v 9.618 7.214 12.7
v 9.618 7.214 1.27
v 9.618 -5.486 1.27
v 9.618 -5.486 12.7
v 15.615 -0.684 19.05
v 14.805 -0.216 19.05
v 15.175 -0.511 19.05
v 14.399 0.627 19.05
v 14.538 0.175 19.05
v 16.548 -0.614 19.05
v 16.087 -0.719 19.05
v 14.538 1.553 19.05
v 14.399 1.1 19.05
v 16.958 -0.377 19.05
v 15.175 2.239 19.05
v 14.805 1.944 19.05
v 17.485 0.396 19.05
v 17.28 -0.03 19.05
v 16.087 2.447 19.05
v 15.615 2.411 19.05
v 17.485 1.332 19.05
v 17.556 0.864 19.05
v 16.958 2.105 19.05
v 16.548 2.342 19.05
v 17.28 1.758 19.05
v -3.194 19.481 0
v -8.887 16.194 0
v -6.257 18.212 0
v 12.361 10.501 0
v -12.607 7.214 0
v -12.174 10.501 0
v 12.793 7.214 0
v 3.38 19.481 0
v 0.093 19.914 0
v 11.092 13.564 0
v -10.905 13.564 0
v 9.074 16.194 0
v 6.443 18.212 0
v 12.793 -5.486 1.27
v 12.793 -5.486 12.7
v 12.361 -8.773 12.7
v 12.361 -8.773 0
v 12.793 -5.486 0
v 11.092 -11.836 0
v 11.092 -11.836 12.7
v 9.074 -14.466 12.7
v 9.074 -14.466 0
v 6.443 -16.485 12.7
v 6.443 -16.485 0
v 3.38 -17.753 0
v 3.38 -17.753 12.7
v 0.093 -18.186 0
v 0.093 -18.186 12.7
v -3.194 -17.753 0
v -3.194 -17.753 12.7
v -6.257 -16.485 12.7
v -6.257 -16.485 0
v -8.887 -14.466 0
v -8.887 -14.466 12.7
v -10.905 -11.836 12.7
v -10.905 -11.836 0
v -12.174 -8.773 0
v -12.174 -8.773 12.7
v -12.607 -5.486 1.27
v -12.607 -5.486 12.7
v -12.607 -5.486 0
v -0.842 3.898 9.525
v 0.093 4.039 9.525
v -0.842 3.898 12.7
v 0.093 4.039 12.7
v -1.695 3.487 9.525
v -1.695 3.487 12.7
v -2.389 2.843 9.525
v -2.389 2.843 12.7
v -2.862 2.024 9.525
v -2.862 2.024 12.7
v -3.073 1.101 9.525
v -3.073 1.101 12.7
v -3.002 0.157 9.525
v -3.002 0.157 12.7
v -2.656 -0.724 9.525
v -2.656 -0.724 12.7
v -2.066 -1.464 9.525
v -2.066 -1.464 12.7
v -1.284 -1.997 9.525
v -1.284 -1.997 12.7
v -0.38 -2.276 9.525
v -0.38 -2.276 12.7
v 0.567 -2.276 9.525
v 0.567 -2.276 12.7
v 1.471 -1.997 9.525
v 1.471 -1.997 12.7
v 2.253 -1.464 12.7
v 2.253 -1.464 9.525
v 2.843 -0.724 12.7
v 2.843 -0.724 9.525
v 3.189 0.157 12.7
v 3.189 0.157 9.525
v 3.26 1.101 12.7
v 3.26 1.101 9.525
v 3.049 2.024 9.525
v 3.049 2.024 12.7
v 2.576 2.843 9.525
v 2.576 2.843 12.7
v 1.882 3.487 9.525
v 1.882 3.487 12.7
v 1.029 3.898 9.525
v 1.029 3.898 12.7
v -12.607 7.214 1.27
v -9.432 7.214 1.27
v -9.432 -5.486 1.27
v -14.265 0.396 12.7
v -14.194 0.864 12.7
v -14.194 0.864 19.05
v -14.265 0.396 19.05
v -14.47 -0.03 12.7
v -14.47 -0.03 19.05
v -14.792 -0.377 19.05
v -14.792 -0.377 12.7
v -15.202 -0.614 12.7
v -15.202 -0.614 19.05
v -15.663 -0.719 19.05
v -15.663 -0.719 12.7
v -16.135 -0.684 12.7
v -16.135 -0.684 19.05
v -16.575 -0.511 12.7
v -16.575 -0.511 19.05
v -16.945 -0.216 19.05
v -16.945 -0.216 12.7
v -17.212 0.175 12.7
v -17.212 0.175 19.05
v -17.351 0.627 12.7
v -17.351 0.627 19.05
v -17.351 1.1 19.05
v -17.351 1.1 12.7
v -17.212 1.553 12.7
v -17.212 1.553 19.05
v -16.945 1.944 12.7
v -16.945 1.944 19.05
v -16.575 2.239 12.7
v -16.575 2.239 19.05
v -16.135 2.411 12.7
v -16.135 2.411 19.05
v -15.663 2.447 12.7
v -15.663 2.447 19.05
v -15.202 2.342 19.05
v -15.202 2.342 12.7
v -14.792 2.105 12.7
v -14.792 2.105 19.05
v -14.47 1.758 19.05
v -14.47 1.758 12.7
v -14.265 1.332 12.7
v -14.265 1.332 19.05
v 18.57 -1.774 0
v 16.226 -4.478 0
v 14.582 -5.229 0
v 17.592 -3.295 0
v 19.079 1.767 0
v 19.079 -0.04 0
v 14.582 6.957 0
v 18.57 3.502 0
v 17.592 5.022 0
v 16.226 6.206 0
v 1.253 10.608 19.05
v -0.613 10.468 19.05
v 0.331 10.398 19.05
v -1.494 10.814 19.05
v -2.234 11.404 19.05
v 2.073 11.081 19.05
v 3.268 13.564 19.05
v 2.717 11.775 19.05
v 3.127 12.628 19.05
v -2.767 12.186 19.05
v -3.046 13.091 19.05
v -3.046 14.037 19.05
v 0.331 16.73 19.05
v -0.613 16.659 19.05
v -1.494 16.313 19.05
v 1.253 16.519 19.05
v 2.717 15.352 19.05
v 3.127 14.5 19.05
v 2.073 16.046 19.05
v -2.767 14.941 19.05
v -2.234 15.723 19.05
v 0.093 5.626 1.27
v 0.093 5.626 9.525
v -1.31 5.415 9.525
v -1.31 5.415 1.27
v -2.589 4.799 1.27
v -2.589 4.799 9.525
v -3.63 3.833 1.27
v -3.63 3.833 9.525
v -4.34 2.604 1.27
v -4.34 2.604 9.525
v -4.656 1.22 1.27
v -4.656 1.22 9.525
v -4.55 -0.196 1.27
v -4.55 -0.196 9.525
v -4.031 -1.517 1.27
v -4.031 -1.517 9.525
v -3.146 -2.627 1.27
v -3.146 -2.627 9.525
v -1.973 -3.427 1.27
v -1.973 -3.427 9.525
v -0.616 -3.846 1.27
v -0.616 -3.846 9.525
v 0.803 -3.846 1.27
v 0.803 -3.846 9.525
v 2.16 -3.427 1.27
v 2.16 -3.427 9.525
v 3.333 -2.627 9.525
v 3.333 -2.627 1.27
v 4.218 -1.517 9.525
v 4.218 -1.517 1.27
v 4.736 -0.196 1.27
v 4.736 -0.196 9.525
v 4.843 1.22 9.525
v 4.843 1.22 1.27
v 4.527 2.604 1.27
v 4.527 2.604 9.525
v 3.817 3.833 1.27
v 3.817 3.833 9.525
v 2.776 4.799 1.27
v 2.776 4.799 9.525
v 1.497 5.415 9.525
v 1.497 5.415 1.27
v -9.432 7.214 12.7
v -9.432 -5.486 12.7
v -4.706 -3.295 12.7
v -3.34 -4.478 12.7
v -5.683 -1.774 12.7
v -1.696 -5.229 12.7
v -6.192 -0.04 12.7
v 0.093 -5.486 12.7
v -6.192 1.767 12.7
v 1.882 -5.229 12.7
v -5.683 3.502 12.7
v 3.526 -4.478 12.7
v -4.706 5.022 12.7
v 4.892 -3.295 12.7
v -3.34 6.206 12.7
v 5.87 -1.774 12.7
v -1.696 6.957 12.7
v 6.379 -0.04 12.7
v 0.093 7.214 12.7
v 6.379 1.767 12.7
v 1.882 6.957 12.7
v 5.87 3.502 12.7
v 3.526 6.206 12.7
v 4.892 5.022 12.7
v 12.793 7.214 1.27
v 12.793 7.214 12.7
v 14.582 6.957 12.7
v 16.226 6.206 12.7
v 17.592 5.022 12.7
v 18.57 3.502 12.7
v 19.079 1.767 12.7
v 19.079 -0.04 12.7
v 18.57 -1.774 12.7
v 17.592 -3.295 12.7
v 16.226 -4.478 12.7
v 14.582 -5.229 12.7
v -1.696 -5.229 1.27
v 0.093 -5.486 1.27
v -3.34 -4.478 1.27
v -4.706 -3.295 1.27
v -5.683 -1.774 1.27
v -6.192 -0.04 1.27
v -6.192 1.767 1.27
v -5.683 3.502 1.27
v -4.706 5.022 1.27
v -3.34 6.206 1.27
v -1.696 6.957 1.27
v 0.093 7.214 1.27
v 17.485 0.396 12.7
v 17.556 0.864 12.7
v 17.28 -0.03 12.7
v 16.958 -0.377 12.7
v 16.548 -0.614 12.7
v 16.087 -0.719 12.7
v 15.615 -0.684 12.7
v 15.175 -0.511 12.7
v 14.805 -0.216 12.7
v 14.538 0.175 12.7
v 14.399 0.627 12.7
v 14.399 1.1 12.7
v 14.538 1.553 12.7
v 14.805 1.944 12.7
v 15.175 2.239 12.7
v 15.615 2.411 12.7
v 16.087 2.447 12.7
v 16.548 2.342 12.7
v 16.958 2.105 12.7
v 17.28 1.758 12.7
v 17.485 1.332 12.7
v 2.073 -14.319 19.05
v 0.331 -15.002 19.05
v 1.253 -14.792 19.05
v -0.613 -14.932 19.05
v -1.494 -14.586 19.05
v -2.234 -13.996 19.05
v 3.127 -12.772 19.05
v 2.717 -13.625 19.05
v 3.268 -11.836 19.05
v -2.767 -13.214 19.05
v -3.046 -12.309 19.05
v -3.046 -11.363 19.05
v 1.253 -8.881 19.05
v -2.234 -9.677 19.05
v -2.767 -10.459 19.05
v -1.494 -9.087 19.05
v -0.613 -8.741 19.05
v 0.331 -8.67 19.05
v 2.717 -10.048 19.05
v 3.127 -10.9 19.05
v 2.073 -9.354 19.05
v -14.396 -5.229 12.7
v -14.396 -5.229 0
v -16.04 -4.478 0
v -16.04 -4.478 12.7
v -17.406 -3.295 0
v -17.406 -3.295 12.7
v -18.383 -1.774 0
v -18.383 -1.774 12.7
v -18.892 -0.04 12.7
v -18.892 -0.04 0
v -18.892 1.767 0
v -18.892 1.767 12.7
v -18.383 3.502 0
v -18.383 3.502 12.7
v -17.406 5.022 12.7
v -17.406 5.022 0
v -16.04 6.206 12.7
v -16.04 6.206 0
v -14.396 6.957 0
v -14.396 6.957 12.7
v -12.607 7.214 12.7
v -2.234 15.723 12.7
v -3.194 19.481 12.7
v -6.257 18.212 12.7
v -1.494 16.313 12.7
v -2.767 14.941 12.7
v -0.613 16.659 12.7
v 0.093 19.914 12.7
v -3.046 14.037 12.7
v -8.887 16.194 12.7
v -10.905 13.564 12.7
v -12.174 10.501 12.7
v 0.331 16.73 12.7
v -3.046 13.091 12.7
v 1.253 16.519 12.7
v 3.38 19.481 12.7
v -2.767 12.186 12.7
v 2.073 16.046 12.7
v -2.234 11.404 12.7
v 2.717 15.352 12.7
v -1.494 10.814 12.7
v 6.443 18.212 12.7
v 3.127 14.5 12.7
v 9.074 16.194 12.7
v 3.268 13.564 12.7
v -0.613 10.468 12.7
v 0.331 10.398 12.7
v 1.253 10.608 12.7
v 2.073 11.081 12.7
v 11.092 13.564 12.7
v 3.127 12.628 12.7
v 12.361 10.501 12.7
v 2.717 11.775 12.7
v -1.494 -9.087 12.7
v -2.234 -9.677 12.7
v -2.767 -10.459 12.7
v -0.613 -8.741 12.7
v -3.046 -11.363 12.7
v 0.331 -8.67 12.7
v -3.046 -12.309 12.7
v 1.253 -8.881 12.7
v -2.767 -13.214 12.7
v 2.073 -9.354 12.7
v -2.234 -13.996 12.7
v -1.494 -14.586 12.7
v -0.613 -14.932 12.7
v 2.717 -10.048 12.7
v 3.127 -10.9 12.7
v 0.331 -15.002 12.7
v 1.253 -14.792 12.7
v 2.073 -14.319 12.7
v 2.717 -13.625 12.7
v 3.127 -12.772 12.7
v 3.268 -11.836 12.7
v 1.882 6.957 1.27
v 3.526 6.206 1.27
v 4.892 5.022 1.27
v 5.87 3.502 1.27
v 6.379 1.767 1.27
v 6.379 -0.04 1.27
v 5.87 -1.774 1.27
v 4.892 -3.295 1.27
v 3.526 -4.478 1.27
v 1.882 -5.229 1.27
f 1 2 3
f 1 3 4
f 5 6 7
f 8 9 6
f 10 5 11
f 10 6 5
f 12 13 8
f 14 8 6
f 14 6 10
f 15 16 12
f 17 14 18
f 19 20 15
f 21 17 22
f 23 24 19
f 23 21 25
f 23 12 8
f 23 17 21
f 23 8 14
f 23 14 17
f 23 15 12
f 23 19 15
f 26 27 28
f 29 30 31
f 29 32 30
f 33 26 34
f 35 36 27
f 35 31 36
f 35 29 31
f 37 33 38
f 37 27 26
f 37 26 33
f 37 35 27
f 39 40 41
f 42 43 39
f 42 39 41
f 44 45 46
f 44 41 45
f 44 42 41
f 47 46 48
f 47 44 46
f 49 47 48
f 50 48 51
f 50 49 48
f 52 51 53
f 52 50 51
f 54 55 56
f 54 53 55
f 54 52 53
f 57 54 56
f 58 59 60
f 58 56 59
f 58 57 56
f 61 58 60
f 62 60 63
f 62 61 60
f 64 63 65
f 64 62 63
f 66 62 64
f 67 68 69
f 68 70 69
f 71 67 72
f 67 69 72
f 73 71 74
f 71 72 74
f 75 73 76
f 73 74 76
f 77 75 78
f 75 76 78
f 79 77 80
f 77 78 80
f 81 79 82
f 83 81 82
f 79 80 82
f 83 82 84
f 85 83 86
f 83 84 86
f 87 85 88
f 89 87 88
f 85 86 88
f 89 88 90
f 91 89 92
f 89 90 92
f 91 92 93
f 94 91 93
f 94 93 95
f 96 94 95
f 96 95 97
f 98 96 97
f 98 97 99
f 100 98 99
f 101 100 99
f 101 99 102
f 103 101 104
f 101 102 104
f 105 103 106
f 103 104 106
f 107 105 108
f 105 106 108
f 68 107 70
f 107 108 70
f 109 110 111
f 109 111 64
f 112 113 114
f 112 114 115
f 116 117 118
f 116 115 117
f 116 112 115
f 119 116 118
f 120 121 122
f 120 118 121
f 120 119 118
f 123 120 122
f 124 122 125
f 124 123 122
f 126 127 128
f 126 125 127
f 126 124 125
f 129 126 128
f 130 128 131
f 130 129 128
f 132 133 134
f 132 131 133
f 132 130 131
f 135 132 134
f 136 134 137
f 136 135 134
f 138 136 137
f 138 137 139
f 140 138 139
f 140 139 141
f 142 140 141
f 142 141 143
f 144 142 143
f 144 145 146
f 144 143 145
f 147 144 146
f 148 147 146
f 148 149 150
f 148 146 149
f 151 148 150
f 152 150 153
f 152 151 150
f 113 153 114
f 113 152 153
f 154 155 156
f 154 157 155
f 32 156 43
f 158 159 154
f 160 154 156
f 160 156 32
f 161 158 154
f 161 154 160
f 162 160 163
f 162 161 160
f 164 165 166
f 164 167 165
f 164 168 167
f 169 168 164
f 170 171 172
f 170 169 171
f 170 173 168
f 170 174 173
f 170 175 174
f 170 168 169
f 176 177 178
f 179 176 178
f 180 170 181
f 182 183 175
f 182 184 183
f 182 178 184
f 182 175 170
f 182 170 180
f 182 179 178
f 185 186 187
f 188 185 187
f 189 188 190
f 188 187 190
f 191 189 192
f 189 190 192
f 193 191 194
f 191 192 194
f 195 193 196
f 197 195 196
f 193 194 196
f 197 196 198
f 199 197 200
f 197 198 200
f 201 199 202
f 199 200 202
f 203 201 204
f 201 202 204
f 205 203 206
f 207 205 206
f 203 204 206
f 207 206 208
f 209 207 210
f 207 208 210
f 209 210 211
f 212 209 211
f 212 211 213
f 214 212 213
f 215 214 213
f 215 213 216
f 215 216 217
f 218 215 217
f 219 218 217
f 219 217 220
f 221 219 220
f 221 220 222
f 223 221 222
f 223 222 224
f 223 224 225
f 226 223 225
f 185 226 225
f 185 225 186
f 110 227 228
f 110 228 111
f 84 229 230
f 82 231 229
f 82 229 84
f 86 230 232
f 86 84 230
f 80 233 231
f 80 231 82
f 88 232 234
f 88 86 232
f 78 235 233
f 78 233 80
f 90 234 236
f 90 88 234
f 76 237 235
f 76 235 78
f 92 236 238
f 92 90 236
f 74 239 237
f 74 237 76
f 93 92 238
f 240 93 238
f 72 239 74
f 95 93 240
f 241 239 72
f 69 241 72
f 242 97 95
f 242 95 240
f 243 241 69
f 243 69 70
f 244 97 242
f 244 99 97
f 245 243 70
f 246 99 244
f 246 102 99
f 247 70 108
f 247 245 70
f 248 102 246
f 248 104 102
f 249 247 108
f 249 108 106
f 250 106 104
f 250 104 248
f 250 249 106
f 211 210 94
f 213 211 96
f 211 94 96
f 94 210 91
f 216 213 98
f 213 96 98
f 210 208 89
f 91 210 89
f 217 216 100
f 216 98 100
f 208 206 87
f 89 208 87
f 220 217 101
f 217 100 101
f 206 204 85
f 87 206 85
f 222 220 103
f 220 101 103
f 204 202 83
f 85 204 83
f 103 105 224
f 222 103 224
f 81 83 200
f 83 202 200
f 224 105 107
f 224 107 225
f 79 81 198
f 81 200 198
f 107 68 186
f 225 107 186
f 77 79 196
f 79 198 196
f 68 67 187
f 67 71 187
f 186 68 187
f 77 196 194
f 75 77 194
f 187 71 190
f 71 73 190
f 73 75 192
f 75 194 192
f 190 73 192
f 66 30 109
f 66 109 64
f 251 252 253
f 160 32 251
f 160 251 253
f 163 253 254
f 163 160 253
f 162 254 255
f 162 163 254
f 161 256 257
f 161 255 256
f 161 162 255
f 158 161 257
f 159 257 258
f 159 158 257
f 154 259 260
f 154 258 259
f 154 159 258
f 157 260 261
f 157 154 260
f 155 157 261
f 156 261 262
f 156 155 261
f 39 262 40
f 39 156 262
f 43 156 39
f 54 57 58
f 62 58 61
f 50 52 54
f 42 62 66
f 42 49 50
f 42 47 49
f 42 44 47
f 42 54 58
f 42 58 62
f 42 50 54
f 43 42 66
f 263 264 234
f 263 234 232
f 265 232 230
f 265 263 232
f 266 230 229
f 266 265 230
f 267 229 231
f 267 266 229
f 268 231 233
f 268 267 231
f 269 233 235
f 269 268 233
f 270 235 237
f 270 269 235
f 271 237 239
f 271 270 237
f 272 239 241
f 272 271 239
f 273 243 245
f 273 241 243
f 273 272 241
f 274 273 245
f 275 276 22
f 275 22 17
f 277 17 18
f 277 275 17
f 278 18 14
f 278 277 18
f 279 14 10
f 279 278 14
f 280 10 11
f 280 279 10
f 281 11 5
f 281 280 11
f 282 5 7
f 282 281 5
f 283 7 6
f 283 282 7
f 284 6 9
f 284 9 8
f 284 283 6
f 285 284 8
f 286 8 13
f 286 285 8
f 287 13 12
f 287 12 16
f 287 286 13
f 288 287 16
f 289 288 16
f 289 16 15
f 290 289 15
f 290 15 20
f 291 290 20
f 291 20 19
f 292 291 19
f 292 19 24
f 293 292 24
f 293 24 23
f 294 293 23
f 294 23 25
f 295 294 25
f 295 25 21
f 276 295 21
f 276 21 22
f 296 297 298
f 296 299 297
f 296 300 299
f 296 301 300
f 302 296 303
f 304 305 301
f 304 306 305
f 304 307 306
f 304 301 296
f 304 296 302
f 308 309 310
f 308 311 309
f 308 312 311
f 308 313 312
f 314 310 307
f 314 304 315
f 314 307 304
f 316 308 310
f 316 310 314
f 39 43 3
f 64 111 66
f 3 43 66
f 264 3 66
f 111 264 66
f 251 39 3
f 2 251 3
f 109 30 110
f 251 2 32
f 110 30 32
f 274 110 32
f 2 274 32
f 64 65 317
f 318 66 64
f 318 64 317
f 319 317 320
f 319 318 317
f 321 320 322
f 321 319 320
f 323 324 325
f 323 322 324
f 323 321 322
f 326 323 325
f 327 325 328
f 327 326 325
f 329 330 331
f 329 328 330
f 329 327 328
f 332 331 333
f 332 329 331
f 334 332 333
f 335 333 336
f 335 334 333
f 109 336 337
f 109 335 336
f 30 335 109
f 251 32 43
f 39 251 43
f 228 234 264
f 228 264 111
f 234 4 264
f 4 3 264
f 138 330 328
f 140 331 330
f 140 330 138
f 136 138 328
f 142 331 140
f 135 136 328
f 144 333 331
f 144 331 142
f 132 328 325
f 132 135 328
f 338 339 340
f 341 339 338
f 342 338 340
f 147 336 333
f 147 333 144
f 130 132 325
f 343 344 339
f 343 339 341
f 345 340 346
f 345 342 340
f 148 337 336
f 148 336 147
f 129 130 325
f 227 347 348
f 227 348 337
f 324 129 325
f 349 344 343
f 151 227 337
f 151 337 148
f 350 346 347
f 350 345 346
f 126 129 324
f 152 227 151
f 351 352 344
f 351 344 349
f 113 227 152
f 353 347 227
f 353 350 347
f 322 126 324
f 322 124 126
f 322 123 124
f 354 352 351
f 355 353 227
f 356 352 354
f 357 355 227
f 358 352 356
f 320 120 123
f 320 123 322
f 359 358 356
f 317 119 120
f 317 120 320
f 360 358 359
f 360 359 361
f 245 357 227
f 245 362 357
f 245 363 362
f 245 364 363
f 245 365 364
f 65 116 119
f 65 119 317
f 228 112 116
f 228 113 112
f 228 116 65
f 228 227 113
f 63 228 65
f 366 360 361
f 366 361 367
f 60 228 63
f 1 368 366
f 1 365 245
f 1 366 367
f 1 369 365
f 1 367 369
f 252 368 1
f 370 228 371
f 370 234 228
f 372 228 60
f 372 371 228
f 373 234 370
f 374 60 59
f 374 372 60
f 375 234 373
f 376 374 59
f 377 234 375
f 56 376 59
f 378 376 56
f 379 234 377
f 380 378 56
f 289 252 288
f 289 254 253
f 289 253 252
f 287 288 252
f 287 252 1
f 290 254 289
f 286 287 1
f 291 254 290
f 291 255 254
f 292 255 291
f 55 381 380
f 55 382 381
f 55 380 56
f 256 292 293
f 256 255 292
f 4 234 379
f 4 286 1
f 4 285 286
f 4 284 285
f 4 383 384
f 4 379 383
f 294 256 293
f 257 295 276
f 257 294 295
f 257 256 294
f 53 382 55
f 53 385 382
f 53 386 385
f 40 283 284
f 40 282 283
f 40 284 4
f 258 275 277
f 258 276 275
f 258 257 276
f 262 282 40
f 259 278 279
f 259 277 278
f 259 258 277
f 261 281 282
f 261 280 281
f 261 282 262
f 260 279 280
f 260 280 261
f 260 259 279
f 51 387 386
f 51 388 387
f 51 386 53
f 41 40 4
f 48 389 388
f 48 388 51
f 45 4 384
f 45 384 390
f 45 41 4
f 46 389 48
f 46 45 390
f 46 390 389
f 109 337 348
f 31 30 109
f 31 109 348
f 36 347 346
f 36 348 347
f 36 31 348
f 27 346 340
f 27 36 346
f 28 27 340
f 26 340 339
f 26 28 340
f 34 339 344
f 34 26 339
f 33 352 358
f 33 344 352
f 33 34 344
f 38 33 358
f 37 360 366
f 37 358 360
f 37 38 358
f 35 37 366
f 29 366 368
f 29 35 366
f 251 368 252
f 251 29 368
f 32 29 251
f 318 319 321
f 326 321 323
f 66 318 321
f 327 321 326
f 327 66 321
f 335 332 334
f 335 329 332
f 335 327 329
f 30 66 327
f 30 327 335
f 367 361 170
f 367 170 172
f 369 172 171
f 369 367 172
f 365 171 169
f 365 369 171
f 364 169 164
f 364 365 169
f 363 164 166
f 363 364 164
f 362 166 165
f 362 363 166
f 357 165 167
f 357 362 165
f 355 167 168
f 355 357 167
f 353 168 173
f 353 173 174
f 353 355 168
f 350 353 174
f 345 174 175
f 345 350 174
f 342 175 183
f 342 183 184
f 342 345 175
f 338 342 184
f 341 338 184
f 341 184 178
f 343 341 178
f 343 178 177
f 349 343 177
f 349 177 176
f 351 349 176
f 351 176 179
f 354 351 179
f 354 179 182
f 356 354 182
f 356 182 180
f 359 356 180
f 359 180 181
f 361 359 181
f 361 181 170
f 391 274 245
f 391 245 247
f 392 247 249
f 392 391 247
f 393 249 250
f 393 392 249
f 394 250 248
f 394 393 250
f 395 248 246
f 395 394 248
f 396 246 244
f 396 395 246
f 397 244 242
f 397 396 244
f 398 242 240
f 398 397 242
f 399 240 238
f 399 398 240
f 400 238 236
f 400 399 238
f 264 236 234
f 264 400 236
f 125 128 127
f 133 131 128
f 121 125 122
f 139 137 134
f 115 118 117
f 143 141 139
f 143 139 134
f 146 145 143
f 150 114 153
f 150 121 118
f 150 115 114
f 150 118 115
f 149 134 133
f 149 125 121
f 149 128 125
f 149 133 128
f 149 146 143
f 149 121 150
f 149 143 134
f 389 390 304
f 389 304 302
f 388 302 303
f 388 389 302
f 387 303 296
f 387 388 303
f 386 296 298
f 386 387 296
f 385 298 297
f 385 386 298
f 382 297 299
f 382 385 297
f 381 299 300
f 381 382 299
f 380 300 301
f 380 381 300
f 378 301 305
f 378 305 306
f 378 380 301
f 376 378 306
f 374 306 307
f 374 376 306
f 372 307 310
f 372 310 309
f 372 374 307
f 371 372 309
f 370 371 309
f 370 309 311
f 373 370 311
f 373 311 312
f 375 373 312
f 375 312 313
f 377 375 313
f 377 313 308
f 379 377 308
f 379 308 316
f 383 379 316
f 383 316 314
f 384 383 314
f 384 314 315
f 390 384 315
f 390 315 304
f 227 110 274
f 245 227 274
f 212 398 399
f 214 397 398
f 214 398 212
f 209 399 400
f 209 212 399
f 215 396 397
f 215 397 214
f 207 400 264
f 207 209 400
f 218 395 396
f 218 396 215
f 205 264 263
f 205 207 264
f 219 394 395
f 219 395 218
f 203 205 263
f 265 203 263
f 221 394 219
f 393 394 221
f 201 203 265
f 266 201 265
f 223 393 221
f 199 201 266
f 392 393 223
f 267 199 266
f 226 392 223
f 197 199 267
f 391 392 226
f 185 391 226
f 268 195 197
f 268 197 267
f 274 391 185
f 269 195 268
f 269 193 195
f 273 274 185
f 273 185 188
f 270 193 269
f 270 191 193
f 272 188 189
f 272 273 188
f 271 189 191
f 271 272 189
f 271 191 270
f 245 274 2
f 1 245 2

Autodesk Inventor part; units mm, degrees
ref_plane "YZ Plane" through (0, 0, 0) normal (1, 0, 0) x (0, 1, 0)
ref_plane "XZ Plane" through (0, 0, 0) normal (0, 1, 0) x (-1, 0, 0)
ref_plane "XY Plane" through (0, 0, 0) normal (0, 0, 1) x (1, 0, 0)
sketch "Sketch1" plane through (0, 0, 0) normal (0, 0, 1) x (1, 0, 0)
  line L0 (-12.6066, 7.2138) -> (12.7934, 7.2138)
  line L1 (12.7934, 7.2138) -> (12.7934, -5.4862)
  line L2 (12.7934, -5.4862) -> (-12.6066, -5.4862)
  line L3 (-12.6066, -5.4862) -> (-12.6066, 7.2138)
  arc A0 (12.7934, 7.2138) -> (-12.6066, 7.2138) centre (0.0934, 7.2138) ccw
  arc A1 (-12.6066, -5.4862) -> (12.7934, -5.4862) centre (0.0934, -5.4862) ccw
  arc A2 (-12.6066, 7.2138) -> (-12.6066, -5.4862) centre (-12.6066, 0.8638) ccw
  arc A3 (12.7934, -5.4862) -> (12.7934, 7.2138) centre (12.7934, 0.8638) ccw
  circle A4 centre (0.0934, 0.8638) radius 6.35
  point P0 (0, 0)
  dimension "d0" = 12.7
  dimension "d1" = 25.4
extrude "Extrusion1" add sketch "Sketch1" along normal blind 12.7 contours A0 L0 | L3 A2 | A4 | L2 A1 | A3 L1
sketch "Sketch2" plane through (0, 0, 12.7) normal (0, 0, 1) x (1, 0, 0)
  line L0 (0.0934, 7.2138) -> (12.7934, 7.2138) projected
  line L1 (0.0934, 7.2138) -> (0.0934, 13.5638)
  line L2 (12.7934, -5.4862) -> (0.0934, -5.4862) projected
  line L3 (0.0934, -5.4862) -> (0.0934, -11.8362)
  circle A0 centre (0.0934, 13.5638) radius 3.175
  circle A1 centre (0.0934, -11.8362) radius 3.175
  point P0 (0, 0)
  dimension "d4" = 6.35
  dimension "d5" = 6.35
  dimension "d6" = 6.35
  dimension "d7" = 6.35
extrude "Extrusion2" add sketch "Sketch2" along normal blind 6.35
sketch "Sketch3" plane through (0, 0, 12.7) normal (0, 0, 1) x (1, 0, 0)
  line L0 (-12.6066, -5.4862) -> (-12.6066, 7.2138) projected
  line L1 (-12.6066, 0.8638) -> (-15.7816, 0.8638)
  line L2 (12.7934, 7.2138) -> (12.7934, -5.4862) projected
  line L3 (12.7934, 0.8638) -> (15.9684, 0.8638)
  circle A0 centre (-15.7816, 0.8638) radius 1.5875
  circle A1 centre (15.9684, 0.8638) radius 1.5875
  point P0 (0, 0)
  dimension "d10" = 3.175
  dimension "d11" = 3.175
  dimension "d12" = 3.175
  dimension "d13" = 3.175
extrude "Extrusion3" add sketch "Sketch3" along normal blind 6.35
sketch "Sketch4" plane through (0, 0, 12.7) normal (0, 0, 1) x (1, 0, 0)
  line L0 (-12.6066, 7.2138) -> (0.0934, 7.2138) projected
  arc A0 (0.0934, 7.2138) -> (0.0934, -5.4862) centre (0.0934, 0.8638) ccw projected
  line L1 (0.0934, 7.2138) -> (0.0934, 7.2138)
  arc A1 (0.0934, -5.4862) -> (0.0934, 7.2138) centre (0.0934, 0.8638) ccw projected
  circle A2 centre (0.0934, 0.8638) radius 3.175
  point P0 (0, 0)
  dimension "d16" = 6.35
extrude "Extrusion4" add sketch "Sketch4" along normal blind 6.35 contours A2
sketch "Sketch7" plane through (0, 0, 0) normal (0, 0, -1) x (-1, 0, 0)
  arc A0 (-0.0934, -5.4862) -> (-0.0934, 7.2138) centre (-0.0934, 0.8638) ccw projected
  point P0 (0, 0)
hole "Hole1" at (0.0934, 0.8638, 0) direction (0, 0, 1) diameter 6.35 end through all counterbore diameter 9.525 counterbore depth 9.525
sketch "Sketch8" plane through (-12.6066, -5.4862, 0) normal (1, 0, 0) x (0, 0, -1)
  line L0 (-12.7, 12.7) -> (-12.7, 0) projected
  line L1 (-12.7, 12.7) -> (0, 12.7)
  line L2 (0, 12.7) -> (0, 0)
  line L3 (0, 0) -> (-12.7, 0)
  line L4 (-12.7, 0) -> (-12.7, 12.7)
  point P0 (0, 5.4862)
extrude "Extrusion7" add sketch "Sketch8" along normal blind 3.175
sketch "Sketch9" plane through (12.7934, -5.4862, 0) normal (-1, 0, 0) x (0, 0, 1)
  line L0 (0, 0) -> (12.7, 0) projected
  line L1 (0, 12.7) -> (12.7, 12.7) projected
  line L2 (12.7, 0) -> (0, 0)
  line L3 (0, 0) -> (0, 12.7)
  line L4 (0, 12.7) -> (12.7, 12.7)
  line L5 (12.7, 12.7) -> (12.7, 0)
  point P0 (0, 5.4862)
extrude "Extrusion8" add sketch "Sketch9" along normal blind 3.175
sketch "Sketch10" plane through (0, 0, 0) normal (0, 0, -1) x (-1, 0, 0)
  arc A0 (-12.7934, 7.2138) -> (-12.7934, -5.4862) centre (-12.7934, 0.8638) ccw projected
  line L0 (-12.7934, 7.2138) -> (-12.7934, -5.4862)
  arc A1 (-12.7934, -5.4862) -> (12.6066, -5.4862) centre (-0.0934, -5.4862) ccw projected
  line L1 (-12.7934, -5.4862) -> (12.6066, -5.4862)
  line L2 (-9.6184, -5.4862) -> (-0.0934, -5.4862) projected
  arc A2 (12.6066, -5.4862) -> (12.6066, 7.2138) centre (12.6066, 0.8638) ccw projected
  line L3 (12.6066, -5.4862) -> (12.6066, -5.4862)
  line L4 (12.6066, 7.2138) -> (12.6066, -5.4862)
  line L5 (12.6066, 7.2138) -> (-12.7934, 7.2138)
  line L6 (-0.0934, 7.2138) -> (-9.6184, 7.2138) projected
  point P0 (0, 0)
extrude "Extrusion9" cut sketch "Sketch10" against normal blind 1.27 contours L5 L4 L1 L0
properties part number "Table"
